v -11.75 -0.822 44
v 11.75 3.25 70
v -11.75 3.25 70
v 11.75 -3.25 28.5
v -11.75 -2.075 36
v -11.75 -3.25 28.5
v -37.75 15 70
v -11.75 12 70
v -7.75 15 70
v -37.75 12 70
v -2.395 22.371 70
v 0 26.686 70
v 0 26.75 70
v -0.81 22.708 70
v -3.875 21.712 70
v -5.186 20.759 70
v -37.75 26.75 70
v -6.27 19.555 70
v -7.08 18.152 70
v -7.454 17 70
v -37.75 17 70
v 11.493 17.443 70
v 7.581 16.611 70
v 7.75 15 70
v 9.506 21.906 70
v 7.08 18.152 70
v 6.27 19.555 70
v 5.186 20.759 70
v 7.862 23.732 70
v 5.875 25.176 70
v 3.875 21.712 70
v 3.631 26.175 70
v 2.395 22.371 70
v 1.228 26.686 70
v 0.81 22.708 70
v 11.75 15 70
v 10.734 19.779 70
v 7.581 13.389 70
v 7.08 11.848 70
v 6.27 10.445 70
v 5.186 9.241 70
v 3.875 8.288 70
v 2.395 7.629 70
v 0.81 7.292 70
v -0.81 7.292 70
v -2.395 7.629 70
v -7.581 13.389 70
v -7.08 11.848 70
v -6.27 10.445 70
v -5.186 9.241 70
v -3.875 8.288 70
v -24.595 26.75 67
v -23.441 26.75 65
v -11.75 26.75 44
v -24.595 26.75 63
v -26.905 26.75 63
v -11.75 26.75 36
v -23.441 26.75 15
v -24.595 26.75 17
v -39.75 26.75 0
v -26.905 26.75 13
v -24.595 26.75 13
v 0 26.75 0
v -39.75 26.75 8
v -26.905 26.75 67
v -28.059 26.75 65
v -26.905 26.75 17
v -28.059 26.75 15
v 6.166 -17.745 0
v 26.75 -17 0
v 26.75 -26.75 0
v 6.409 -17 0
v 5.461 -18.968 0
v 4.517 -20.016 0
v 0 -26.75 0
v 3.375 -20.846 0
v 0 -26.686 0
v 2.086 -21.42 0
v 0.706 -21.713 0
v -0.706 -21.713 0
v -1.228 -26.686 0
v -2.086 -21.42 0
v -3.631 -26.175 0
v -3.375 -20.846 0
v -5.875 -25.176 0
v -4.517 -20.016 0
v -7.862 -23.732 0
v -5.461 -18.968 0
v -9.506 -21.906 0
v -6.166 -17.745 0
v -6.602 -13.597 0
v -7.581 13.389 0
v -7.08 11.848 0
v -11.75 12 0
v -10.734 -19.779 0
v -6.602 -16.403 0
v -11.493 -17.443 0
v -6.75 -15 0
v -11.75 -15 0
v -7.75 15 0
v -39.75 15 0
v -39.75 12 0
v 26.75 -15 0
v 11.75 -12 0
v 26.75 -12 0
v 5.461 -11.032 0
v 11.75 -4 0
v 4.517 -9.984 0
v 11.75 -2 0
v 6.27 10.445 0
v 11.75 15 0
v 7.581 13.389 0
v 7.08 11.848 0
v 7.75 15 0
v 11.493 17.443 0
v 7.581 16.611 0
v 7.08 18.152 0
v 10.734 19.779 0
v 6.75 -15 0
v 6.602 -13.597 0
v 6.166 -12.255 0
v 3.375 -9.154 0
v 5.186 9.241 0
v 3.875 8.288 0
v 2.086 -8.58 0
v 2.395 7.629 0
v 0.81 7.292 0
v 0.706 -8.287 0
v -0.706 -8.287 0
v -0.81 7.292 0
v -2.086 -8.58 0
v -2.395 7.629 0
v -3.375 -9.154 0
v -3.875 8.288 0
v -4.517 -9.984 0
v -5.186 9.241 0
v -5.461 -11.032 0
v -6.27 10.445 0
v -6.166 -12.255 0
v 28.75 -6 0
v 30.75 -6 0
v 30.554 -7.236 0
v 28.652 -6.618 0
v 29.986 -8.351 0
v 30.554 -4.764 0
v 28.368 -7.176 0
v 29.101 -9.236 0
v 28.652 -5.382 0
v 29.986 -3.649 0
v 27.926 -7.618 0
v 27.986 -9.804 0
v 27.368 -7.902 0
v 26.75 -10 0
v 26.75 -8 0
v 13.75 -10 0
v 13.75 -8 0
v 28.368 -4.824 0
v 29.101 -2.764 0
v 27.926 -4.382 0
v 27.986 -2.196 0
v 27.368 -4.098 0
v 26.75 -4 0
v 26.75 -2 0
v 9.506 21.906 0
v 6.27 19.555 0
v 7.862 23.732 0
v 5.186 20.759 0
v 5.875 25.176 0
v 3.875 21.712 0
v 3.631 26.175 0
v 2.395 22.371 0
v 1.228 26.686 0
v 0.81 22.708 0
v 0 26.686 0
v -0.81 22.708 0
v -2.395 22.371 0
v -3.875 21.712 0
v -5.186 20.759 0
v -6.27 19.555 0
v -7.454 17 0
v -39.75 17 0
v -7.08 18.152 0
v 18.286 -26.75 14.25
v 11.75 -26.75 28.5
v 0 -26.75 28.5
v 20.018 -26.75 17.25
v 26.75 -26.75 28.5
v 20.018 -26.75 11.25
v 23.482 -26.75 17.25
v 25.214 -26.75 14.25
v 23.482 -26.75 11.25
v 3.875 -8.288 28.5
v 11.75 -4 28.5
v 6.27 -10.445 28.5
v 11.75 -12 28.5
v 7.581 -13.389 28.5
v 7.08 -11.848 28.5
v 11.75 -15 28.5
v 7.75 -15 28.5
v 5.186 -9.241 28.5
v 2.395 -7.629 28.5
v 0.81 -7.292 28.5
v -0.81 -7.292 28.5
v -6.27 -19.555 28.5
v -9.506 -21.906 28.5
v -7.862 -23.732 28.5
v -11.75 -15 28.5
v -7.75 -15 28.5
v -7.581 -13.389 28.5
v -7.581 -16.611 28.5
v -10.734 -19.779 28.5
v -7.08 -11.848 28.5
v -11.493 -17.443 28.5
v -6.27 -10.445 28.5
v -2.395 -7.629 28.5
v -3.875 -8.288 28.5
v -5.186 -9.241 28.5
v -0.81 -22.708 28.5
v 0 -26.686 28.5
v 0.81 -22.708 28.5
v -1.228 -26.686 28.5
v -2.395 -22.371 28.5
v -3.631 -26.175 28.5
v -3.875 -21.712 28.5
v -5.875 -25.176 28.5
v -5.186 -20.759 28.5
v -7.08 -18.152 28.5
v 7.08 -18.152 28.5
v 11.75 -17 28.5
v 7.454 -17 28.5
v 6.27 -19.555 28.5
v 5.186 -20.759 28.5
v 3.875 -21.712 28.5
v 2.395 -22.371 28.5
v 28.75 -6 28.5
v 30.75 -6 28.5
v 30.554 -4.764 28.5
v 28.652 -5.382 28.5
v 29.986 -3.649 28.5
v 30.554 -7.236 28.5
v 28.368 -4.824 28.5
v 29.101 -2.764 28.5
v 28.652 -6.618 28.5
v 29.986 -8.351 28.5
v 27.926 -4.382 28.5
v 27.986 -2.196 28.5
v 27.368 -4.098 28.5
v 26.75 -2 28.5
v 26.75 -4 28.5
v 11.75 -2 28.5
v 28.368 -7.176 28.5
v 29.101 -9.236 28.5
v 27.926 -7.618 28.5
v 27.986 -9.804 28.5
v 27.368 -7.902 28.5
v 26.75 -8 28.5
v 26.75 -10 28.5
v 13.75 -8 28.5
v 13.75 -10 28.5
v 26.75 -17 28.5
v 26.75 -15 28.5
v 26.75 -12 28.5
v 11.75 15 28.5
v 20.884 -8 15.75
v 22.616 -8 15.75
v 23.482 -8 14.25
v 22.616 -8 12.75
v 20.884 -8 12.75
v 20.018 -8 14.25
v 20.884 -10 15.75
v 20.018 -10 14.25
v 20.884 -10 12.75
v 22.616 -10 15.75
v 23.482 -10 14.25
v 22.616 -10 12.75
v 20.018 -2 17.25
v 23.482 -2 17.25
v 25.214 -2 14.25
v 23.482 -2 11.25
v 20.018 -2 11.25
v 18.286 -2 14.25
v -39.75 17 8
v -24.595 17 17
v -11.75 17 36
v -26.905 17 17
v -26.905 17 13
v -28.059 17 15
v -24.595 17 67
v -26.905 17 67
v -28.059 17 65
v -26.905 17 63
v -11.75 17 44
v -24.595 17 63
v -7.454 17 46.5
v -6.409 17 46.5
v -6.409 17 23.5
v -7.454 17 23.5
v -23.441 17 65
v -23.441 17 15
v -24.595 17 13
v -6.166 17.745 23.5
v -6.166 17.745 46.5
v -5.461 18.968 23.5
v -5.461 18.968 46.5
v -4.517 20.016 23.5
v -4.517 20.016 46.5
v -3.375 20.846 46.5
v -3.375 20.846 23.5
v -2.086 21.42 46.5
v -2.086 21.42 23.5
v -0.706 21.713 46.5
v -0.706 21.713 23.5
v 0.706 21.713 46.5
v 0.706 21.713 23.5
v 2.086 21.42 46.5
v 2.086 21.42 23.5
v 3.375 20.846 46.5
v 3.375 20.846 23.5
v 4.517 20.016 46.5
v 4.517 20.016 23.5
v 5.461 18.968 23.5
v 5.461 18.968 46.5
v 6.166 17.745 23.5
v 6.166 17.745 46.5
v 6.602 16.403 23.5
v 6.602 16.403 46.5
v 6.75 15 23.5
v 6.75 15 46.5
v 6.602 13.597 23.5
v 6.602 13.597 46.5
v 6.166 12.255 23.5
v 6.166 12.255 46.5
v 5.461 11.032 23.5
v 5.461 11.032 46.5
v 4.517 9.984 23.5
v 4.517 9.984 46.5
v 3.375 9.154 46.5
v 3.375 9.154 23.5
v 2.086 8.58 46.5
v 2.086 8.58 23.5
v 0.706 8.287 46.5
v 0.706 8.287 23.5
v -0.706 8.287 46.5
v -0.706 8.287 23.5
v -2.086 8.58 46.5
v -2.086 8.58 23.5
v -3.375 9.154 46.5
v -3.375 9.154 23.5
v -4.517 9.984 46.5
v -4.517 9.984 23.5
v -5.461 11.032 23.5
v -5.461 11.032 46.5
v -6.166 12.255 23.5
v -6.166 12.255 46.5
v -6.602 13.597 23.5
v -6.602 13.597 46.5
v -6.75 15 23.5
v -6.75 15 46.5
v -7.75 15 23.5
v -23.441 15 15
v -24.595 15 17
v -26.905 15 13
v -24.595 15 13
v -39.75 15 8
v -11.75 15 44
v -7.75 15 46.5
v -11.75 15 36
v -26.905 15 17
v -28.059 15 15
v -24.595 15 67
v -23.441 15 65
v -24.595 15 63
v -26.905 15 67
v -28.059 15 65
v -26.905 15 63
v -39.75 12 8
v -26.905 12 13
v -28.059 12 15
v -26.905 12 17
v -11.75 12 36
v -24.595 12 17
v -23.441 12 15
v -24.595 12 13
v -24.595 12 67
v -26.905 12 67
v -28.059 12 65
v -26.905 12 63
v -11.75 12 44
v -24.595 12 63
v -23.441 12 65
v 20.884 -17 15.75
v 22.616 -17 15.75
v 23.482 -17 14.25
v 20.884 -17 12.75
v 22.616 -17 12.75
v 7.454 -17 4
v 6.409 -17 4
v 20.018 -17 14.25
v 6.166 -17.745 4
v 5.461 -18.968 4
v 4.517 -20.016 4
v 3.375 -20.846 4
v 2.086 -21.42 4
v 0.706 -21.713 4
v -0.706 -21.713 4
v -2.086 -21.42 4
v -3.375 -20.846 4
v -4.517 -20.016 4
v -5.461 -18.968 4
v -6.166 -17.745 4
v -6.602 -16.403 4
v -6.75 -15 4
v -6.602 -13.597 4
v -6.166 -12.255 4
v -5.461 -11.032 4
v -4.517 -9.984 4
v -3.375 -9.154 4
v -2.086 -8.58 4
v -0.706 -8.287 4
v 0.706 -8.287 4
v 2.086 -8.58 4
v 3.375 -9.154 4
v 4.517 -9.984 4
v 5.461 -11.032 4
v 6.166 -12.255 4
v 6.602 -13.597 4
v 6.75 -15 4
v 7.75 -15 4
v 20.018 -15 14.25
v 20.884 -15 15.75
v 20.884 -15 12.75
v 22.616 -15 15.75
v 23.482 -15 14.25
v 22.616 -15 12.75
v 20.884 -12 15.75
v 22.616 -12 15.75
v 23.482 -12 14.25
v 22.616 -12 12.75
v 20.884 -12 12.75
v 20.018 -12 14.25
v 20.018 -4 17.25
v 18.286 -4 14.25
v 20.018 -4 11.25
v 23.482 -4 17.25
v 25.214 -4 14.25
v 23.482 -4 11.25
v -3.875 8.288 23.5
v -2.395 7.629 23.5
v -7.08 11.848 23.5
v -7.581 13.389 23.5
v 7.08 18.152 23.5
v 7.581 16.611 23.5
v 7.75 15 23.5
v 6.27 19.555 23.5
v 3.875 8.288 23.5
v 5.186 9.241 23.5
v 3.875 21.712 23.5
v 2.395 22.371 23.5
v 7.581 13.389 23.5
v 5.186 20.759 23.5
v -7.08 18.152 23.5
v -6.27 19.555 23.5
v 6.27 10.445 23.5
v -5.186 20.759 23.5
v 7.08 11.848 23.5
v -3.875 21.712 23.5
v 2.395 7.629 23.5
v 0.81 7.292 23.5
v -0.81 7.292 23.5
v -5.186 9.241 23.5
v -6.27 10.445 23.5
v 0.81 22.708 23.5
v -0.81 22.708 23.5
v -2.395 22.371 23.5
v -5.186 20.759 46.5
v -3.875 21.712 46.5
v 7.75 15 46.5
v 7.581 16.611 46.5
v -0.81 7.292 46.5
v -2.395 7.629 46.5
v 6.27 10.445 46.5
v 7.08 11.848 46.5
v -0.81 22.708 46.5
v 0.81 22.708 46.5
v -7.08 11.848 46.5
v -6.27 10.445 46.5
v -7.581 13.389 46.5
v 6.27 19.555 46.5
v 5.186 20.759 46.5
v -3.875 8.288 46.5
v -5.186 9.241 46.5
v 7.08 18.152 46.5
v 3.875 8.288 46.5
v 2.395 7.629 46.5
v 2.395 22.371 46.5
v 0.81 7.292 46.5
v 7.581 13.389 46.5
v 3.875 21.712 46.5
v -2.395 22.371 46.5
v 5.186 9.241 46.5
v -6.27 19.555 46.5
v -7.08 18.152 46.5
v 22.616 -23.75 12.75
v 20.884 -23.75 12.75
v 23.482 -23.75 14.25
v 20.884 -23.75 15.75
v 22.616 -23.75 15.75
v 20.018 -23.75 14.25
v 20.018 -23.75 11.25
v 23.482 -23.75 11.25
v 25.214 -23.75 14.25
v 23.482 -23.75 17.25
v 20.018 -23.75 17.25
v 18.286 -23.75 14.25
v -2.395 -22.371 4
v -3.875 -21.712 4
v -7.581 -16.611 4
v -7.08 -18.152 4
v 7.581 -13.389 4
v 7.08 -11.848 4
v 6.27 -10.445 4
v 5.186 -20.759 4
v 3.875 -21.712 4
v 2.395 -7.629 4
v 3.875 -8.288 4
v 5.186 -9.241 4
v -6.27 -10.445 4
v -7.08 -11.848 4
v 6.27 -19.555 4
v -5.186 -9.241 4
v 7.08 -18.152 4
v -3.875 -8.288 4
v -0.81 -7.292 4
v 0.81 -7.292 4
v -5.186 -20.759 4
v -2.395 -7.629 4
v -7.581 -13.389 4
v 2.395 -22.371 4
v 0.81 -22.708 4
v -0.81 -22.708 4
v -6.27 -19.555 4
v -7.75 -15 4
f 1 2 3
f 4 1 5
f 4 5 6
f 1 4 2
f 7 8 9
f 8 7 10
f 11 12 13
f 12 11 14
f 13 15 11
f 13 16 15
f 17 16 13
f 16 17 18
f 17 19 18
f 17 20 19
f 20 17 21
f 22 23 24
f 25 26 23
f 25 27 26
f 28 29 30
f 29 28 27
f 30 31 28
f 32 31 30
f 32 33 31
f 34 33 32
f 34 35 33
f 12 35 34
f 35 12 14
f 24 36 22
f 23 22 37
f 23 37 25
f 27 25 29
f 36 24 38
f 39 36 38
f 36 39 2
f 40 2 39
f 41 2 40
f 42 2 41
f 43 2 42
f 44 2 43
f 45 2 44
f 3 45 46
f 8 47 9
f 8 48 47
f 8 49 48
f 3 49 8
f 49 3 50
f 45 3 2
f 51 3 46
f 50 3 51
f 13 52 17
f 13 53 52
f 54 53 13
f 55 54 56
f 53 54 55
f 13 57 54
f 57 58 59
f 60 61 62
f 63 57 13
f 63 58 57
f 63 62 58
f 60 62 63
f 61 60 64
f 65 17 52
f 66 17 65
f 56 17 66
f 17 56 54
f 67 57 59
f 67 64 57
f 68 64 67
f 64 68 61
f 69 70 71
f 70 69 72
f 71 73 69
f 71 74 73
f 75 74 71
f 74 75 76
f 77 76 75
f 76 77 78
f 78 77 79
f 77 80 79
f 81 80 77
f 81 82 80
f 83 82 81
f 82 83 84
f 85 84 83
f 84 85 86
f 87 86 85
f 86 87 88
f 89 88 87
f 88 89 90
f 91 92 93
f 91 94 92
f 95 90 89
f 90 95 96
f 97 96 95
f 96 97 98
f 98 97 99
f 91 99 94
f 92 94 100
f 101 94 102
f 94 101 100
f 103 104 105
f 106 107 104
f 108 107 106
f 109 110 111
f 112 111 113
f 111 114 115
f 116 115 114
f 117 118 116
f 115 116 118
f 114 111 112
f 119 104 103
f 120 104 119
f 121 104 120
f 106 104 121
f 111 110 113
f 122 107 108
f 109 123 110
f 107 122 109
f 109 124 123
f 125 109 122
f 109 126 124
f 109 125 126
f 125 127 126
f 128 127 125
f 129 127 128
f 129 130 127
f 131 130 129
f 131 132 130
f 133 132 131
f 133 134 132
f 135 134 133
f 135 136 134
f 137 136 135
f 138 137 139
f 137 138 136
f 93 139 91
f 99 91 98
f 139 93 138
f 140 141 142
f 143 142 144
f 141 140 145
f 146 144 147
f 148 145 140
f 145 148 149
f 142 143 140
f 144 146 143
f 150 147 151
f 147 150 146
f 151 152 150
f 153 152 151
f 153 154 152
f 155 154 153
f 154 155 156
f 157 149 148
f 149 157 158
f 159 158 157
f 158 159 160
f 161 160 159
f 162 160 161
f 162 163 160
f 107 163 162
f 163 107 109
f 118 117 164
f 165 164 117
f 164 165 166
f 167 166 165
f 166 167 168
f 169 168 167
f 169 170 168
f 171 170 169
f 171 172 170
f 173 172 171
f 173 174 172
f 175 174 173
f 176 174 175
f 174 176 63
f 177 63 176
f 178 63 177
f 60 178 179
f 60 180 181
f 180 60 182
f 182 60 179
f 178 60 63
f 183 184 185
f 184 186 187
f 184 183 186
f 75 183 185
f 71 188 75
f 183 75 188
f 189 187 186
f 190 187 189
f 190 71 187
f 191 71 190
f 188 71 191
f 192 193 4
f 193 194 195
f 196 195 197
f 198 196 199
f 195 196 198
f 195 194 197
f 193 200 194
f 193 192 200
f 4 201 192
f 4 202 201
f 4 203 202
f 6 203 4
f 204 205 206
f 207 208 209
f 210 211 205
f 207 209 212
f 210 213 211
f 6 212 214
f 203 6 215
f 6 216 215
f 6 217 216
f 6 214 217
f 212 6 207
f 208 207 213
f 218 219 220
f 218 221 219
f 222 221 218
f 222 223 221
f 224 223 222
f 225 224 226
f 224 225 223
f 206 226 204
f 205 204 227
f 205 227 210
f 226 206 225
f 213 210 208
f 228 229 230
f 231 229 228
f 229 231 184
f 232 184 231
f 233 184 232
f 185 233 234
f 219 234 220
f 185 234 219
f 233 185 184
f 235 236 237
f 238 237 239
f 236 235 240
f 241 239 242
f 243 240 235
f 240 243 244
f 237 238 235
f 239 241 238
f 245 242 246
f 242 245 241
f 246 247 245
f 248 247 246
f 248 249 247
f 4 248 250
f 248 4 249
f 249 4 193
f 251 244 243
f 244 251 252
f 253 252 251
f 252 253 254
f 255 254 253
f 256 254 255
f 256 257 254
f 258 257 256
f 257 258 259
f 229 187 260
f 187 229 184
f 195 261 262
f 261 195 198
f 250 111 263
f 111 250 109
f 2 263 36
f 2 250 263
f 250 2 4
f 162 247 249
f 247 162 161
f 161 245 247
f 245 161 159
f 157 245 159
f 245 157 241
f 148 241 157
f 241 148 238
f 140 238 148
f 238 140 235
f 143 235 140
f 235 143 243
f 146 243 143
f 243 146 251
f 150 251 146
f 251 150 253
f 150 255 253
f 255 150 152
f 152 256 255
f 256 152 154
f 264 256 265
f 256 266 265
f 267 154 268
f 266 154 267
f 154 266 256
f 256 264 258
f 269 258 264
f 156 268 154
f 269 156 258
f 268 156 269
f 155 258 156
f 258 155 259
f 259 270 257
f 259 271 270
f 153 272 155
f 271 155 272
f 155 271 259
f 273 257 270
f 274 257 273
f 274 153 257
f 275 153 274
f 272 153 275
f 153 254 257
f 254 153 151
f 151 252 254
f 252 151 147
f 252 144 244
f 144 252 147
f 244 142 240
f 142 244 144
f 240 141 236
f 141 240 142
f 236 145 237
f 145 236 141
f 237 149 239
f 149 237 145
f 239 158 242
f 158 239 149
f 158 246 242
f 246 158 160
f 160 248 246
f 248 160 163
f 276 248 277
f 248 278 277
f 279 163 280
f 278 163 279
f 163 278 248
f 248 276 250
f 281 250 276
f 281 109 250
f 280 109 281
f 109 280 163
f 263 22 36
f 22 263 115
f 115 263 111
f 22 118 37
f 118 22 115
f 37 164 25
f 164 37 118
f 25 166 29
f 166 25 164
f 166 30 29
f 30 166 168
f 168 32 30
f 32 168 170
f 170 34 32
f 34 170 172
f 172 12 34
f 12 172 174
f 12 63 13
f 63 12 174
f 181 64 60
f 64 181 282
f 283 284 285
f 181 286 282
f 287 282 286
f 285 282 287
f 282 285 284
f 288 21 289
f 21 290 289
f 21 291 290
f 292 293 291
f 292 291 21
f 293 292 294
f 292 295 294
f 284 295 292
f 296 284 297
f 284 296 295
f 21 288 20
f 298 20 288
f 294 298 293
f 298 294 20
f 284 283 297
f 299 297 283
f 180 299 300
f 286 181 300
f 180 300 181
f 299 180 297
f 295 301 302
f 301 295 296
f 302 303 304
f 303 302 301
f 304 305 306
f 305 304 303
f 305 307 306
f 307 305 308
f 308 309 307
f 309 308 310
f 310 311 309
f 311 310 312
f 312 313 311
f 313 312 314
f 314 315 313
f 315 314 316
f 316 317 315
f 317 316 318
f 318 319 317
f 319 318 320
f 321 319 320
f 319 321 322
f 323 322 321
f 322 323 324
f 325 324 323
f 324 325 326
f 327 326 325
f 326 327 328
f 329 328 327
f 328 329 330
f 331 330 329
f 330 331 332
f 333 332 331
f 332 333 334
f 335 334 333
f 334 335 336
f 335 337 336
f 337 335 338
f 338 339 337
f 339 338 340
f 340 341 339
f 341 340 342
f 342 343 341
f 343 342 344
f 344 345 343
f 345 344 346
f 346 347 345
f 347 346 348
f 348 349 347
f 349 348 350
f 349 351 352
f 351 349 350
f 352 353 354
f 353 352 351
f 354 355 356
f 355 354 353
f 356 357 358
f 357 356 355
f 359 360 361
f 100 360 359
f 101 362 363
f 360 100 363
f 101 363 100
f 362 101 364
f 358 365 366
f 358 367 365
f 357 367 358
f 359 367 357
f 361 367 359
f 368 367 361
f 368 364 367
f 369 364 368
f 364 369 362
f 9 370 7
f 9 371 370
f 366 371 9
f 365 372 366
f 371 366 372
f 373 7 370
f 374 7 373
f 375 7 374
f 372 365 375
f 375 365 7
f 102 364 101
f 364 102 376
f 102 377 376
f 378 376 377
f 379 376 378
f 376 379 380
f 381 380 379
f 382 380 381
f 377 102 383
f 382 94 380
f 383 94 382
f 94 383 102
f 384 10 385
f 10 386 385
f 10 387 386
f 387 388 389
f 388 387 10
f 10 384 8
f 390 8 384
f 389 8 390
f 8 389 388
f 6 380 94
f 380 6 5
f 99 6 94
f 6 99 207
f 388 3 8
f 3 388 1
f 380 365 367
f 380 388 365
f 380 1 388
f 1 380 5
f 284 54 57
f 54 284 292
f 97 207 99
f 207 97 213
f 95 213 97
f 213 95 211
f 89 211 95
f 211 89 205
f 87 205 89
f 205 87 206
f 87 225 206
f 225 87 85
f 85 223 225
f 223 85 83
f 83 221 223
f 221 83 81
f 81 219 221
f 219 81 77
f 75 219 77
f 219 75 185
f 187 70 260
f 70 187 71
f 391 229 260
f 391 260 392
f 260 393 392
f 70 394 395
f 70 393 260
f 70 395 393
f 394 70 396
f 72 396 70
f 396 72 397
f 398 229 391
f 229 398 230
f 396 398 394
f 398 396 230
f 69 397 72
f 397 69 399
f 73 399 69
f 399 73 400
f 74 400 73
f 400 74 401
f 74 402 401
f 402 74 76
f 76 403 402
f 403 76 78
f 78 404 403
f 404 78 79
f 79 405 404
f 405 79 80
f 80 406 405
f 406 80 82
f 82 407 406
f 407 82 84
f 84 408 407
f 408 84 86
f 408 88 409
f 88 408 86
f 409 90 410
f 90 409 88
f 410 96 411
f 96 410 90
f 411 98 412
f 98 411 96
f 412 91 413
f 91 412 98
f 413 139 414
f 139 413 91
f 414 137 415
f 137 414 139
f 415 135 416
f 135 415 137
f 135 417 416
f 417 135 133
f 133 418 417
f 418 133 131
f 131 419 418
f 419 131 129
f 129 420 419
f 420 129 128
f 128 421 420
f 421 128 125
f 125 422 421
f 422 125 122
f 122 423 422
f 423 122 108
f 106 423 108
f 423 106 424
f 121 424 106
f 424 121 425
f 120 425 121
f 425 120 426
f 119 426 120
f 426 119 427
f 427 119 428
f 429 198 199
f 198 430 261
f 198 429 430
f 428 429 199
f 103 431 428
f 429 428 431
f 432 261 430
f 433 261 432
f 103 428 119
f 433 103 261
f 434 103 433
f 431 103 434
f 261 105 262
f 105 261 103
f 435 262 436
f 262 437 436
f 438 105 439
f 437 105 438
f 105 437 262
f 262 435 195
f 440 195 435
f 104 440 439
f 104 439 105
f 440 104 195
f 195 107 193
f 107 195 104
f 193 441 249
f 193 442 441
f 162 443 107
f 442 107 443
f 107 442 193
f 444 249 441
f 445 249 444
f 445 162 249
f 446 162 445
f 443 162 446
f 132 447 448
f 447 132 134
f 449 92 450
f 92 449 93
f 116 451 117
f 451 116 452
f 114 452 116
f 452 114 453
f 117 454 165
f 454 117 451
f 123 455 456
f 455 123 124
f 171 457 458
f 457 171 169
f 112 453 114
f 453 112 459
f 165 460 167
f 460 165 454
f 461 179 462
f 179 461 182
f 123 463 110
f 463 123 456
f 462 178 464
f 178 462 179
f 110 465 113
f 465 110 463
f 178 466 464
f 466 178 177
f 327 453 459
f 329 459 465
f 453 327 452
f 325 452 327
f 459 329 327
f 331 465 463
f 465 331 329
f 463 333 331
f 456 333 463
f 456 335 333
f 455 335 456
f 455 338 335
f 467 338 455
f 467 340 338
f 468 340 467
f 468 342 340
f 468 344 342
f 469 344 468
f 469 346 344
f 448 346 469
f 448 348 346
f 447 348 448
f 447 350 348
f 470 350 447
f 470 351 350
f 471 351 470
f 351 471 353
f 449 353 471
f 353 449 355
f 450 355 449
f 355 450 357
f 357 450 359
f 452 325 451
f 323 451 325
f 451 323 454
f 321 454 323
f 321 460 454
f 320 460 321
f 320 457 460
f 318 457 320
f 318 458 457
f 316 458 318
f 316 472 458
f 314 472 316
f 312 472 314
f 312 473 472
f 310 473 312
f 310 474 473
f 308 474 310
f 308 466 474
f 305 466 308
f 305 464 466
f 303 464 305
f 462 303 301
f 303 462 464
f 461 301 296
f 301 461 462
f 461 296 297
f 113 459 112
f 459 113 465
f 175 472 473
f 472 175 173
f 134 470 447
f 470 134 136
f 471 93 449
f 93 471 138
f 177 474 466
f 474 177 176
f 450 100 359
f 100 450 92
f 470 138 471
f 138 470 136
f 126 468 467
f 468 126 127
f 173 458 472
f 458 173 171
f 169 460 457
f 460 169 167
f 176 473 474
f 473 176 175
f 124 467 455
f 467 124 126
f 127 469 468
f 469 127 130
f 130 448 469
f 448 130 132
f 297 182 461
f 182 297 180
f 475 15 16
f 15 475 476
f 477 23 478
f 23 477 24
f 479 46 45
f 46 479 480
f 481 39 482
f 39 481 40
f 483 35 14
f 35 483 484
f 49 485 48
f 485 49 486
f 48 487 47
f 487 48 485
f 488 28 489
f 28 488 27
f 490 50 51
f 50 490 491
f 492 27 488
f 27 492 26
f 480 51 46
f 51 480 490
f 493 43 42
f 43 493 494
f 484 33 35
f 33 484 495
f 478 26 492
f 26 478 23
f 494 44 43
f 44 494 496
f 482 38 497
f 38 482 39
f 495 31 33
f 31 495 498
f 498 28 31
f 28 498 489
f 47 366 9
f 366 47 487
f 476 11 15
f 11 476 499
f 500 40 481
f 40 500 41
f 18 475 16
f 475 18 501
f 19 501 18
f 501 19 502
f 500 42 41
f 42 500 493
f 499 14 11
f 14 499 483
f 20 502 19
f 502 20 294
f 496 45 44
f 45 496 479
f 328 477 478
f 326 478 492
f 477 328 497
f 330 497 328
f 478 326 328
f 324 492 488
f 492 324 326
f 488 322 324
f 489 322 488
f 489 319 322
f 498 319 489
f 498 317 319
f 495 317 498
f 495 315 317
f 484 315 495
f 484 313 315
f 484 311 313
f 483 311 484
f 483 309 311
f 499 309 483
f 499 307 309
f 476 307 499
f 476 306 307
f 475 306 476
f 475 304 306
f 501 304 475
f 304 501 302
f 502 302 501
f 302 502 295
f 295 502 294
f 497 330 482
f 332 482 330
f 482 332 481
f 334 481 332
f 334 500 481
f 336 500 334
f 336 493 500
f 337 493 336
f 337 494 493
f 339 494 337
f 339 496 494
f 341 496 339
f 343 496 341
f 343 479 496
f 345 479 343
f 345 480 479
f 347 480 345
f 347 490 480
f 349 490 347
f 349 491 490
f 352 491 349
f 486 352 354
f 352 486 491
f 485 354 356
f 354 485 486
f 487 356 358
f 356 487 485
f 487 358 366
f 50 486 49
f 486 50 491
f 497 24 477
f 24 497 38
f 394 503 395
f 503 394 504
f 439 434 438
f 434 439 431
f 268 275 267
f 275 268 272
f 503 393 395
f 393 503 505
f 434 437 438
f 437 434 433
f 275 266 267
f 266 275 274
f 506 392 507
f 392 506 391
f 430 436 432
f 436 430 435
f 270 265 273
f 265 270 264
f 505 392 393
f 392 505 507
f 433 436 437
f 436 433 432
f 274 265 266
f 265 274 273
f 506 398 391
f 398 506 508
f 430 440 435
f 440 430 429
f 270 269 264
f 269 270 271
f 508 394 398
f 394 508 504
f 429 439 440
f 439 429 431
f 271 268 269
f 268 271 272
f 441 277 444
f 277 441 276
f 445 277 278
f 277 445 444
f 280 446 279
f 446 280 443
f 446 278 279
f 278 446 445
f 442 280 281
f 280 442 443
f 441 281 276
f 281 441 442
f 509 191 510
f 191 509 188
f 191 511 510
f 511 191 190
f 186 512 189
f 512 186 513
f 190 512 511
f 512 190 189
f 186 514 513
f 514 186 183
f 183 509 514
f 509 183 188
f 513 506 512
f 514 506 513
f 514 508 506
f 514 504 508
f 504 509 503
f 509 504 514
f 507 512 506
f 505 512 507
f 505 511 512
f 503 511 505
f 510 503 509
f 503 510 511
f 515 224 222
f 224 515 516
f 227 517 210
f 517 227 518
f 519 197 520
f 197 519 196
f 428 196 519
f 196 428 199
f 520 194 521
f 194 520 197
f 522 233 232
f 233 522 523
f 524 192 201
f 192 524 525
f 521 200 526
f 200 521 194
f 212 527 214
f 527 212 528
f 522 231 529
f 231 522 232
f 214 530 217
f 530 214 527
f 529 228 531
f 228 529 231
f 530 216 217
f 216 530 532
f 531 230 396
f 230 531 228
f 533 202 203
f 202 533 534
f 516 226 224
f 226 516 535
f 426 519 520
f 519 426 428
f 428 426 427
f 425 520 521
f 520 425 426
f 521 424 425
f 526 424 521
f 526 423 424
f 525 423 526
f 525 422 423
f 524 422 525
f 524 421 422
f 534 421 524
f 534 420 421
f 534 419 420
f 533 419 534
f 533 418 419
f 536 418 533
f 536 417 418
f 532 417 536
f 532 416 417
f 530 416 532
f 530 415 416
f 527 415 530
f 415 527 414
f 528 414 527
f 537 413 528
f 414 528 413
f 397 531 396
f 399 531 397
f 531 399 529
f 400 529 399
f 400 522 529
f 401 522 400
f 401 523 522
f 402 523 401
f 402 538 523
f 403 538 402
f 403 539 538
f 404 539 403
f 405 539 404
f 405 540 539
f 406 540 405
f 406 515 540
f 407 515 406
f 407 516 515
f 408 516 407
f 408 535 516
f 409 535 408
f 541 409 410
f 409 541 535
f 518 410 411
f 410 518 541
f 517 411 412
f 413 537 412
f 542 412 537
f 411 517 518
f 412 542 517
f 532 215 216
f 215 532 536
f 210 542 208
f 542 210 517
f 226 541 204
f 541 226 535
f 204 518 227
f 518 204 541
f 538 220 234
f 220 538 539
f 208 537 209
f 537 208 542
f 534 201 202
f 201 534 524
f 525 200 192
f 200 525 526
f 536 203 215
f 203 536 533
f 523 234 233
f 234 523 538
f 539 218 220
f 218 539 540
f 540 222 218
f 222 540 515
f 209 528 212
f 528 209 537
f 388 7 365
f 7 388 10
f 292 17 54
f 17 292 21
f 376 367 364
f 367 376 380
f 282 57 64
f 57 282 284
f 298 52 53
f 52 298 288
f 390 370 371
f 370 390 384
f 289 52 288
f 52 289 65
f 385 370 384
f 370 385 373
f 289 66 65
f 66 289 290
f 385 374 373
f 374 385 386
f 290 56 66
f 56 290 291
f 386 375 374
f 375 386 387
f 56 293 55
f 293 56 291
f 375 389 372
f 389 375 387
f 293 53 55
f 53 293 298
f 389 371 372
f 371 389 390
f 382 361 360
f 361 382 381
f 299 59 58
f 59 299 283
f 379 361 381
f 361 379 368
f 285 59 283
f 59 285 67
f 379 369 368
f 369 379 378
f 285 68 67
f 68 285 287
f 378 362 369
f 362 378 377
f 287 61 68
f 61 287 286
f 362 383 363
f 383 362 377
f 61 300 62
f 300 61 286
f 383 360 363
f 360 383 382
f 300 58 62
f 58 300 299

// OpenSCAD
include <wallace.scad>;

!x_carriage2();


module x_carriage2() difference() {
	intersection() {
		linear_extrude(height = x_carriage_width, convexity = 5) difference() {
			union() {
				square([bearing_size + 8, x_rod_spacing], center = true);
				translate([0, -x_rod_spacing / 2 - bearing_size / 2 - 4, 0]) square([bearing_size / 2 + 4 + 15, x_rod_spacing / 2 + bearing_size / 2 + 4 - 2 - pulley_size / 2]);
				translate([0, -pulley_size / 2, 0]) {
					square([bearing_size / 2 + 4 + 15, 8]);
					translate([bearing_size / 2 + 4 + 15, 4, 0]) circle(4);
				}
				rotate(180) translate([0, -x_rod_spacing / 2 - bearing_size / 2 - 4, 0]) square([bearing_size / 2 + 4 + 28, bearing_size / 2 + 4 + 3]);
				for(side = [1, -1]) translate([0, side * x_rod_spacing / 2, 0]) circle(bearing_size / 2 + 4, $fn = 30);
			}
			translate([bearing_size / 2 + 4, 2 - pulley_size / 2, 0]) {
				square([15, 4]);
				translate([0, -3, 0]) square([2, 4]);
				translate([15, 2, 0]) circle(2);
			}
			for(side = [1, -1]) translate([0, side * x_rod_spacing / 2, 0]) {
				circle(bearing_size / 2 -1, $fn = 30);
				rotate(90 * side) square([2, bearing_size / 2 + 40]);
			}
		}
		
		difference() {
			rotate([0, -90, 0]) #linear_extrude(height = bearing_size + 1000, convexity = 5, center = true) difference() {
				#polygon([
					[
						0,
						(x_rod_spacing / 2 + bearing_size / 2 + 4)
					],[
						0,
						-(x_rod_spacing / 2 + bearing_size / 2 + 4)
					],[
						bearing_length + 4,
						-(x_rod_spacing / 2 + bearing_size / 2 + 4)
					],[
						bearing_length + 4,
						-(x_rod_spacing / 2 - bearing_size / 2 - 4)
					],[
						x_carriage_width,
						(x_rod_spacing / 2 - bearing_size / 2 - 4)
					],[
						x_carriage_width,
						(x_rod_spacing / 2 + bearing_size / 2 + 4)
					]
				]);
			}
			translate([bearing_size / 2 + 4, -50, bearing_length + 4]) cube(100);
		}
		
	}
	// linear bearings
	translate([0, x_rod_spacing / 2, 0]) rotate([0, 0, 0]) {
		%translate([0, 0, 20]) rotate(180 / 8) cylinder(r = rod_size * da8, h = 200, center = true, $fn = 8);
		for(end = [0, 1]) mirror([0, 0, end]) translate([0, 0, end * -x_carriage_width - 1]) cylinder(r = bearing_size / 2, h = bearing_length, $fn = 30);
	}
	
	translate([0, -x_rod_spacing / 2, 0]) rotate([0, 0, 0]) {
		translate([0, 0, 4]) cylinder(r = bearing_size / 2, h = x_carriage_width + 1, center = false, $fn = 30);
		%translate([0, 0,20]) rotate(180 / 8) cylinder(r = rod_size * da8, h = 200, center = true, $fn = 8);
	}
	
	// screw holes
	translate([bearing_size / 2 + 4 + 10, 5 - pulley_size / 2, bearing_length / 2 + 2]) rotate([90, 0, 0]) {
		cylinder(r = m3_size * da6, h = x_rod_spacing + bearing_size + 10, center = true, $fn = 6);
		rotate([180, 0, 0]) cylinder(r = m3_size * da6 * 2, h = x_rod_spacing + bearing_size + 10, center = false, $fn = 6);
		translate([0, 0, x_rod_spacing / 2 + bearing_size / 2 + 6 - pulley_size / 2]) cylinder(r = m3_nut_size * da6, h = x_rod_spacing + bearing_size + 10, center = false, $fn = 6);
	}
	//#for(side = [1, -1]) translate([-bearing_size / 2 - 4 - 14, 0, x_carriage_width / 2 + carriage_extruder_offset + side * 25]) rotate([90, 0, 0]) cylinder(r = 4.1, h = x_rod_spacing - 10, center = true, $fn = 6);

	// weghalen driehoek
	translate([-bearing_size / 2 - 4 - 14, 0, x_carriage_width / 2 + carriage_extruder_offset]) rotate([90, 0, 0]) linear_extrude(height = bearing_size + x_rod_spacing + 10, center = true, convexity = 5) {
		*translate([-14, 0, 0]) {
			circle(20);
			rotate(45) square(5);
		}
		intersection() {
			translate([18, 0, 0]) rotate(135) #square(100);
			translate([-14, 0, 0]) #square([56, 100], center = true);
		}
		for(side = [1, -1]) translate([0, side * 25, 0]) circle(m4_size * da6, $fn = 6);
	}

	}
